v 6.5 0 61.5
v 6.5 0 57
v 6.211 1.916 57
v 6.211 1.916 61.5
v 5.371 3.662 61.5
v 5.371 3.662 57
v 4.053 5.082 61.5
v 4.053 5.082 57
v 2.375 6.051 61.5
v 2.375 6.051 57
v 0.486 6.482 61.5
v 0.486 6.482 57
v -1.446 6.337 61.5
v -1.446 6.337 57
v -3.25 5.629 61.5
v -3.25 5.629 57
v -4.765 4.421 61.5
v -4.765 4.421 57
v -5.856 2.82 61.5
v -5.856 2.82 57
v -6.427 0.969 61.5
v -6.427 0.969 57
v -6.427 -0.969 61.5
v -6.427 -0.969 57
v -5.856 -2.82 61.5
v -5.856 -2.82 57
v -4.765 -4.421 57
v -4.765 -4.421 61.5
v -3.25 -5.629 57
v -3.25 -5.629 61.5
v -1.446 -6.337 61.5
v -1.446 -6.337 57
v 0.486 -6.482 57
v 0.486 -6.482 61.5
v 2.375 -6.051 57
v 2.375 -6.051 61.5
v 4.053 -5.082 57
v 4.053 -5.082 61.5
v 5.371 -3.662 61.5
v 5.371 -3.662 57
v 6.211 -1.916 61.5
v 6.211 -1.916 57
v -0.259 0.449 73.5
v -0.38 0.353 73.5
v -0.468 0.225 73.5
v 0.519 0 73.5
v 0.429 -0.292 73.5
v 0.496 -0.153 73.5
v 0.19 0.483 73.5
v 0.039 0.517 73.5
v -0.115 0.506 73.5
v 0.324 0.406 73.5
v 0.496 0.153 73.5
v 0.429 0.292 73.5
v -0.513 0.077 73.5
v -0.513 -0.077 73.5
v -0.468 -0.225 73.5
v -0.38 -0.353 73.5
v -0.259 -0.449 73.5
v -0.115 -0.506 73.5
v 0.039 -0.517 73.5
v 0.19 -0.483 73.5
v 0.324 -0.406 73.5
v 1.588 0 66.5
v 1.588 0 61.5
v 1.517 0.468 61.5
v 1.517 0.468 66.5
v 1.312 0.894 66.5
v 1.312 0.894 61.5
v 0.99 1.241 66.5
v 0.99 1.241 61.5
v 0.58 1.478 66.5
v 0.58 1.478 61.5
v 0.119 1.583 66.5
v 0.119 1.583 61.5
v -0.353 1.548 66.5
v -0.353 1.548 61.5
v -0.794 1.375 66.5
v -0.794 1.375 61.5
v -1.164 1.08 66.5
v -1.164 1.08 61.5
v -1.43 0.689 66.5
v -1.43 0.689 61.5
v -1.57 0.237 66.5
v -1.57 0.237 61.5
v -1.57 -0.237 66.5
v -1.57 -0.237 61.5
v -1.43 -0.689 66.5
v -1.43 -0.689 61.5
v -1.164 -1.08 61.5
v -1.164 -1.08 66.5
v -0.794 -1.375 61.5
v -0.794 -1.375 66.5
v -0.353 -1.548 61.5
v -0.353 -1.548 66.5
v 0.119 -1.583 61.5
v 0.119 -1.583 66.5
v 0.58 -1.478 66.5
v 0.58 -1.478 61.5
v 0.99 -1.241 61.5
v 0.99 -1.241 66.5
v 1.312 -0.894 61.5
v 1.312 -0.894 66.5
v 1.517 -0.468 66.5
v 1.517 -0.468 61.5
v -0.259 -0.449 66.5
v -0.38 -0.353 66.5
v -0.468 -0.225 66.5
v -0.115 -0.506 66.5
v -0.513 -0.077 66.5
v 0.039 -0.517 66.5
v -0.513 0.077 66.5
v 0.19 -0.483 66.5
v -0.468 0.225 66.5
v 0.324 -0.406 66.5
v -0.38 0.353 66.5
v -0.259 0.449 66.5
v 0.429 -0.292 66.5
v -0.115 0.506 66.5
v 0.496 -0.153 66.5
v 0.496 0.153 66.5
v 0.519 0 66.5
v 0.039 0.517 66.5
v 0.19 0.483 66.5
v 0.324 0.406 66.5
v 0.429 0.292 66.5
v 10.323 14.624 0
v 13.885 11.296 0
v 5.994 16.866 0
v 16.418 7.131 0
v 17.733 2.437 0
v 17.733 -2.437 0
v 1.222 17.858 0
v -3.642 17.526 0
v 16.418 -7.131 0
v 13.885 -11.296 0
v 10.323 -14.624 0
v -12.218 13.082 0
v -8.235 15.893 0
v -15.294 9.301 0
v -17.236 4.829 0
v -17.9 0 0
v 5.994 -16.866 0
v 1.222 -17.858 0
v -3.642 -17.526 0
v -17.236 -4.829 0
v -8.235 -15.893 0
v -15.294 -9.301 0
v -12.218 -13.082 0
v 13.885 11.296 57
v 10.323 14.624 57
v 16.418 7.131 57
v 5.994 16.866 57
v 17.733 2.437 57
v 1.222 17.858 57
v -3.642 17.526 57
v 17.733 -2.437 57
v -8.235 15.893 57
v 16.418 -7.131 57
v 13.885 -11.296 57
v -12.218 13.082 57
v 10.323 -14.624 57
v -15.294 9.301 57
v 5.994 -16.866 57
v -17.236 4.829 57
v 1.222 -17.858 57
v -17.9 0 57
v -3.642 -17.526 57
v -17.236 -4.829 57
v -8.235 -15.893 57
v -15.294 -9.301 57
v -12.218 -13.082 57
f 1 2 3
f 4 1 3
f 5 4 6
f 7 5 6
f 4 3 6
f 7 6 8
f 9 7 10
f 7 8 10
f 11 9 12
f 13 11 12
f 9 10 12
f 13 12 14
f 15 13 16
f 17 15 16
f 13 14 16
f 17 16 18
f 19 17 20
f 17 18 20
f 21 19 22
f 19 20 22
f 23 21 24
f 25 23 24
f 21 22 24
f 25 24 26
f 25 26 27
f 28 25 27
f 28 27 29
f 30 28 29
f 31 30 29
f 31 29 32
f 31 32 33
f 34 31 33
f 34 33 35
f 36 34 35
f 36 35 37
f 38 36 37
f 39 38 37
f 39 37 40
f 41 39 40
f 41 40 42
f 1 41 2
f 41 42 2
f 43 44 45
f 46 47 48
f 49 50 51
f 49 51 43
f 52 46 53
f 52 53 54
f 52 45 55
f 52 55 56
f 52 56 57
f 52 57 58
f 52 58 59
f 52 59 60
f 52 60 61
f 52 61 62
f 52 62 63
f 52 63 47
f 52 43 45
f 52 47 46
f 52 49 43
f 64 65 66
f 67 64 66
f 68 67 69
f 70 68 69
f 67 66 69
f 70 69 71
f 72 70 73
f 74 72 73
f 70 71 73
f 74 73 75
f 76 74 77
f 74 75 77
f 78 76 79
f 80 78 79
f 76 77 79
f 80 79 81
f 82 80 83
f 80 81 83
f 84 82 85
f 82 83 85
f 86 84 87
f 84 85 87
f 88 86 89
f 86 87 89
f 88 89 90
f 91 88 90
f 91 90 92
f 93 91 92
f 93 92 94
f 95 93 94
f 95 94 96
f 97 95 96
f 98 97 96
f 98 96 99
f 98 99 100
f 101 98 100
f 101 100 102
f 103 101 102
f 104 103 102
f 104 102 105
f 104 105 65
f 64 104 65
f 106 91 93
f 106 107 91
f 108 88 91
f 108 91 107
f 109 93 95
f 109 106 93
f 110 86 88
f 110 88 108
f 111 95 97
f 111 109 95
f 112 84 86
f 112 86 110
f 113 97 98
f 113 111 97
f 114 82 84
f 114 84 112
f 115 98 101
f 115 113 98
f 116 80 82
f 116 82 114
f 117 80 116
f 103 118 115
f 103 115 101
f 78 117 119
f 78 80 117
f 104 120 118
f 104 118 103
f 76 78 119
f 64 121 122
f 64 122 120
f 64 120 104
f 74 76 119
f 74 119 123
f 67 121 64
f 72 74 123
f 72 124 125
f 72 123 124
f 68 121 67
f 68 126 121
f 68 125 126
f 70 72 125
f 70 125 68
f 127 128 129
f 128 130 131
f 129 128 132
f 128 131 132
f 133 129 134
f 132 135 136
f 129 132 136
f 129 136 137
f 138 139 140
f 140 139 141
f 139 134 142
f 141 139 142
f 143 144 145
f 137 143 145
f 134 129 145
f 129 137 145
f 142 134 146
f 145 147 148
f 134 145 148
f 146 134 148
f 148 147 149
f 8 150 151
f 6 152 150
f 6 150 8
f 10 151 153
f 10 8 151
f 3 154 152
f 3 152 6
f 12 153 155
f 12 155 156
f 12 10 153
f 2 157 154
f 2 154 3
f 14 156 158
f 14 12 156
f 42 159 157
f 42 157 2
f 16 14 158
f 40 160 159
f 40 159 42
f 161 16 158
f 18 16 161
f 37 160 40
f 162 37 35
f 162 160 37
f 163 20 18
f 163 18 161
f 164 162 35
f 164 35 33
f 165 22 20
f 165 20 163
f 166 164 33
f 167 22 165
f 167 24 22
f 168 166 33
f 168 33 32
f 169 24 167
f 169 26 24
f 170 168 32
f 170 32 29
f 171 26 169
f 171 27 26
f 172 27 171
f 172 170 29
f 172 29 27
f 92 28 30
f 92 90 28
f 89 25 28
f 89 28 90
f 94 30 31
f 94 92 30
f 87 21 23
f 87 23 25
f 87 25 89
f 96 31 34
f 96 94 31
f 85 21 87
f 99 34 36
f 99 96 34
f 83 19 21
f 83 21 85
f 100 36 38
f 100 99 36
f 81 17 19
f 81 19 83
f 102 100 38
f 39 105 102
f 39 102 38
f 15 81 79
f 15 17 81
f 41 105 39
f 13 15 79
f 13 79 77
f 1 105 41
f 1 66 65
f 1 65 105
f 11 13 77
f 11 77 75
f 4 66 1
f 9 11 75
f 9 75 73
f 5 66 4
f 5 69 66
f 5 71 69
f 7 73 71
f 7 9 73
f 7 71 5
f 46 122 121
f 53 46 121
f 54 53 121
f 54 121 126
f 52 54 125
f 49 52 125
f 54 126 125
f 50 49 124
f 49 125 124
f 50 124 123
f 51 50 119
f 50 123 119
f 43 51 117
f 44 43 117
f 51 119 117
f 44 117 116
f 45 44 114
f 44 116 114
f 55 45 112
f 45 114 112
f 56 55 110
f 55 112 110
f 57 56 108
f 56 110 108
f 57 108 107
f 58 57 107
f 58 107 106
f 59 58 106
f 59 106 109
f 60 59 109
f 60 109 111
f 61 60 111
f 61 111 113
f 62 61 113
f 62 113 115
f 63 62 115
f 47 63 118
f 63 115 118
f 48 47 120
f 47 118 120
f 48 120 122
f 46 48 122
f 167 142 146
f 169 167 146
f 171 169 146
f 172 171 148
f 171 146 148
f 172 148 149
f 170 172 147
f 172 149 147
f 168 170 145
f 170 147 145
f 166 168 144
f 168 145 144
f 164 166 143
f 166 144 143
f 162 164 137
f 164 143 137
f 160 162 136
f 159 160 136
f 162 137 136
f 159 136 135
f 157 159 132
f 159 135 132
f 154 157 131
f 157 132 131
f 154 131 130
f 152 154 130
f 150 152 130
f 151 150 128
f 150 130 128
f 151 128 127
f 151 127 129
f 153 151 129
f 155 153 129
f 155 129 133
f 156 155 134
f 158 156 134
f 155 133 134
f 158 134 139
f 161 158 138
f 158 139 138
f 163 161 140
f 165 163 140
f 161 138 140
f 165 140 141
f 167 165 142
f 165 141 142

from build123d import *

# Parameters (mm, degrees)
SKETCH1_R           = 17.9
BOSS_EXTRUDE1_DEPTH = 57
SKETCH2_R           = 6.5
BOSS_EXTRUDE2_DEPTH = 4.5
SKETCH3_R           = 1.5875
BOSS_EXTRUDE3_DEPTH = 12
CUT_EXTRUDE1_START  = -7
SKETCH4_R           = 1.5875
SKETCH4_R_2         = 0.518930275
CUT_EXTRUDE1_DEPTH  = 7


with BuildPart() as part:
    # Sketch1 → Boss-Extrude1 (new body)
    with BuildSketch(Plane.XY):
        with Locations(Location((0, 0, 0), (0, 0, 180))):
            Circle(SKETCH1_R)
    extrude(amount=BOSS_EXTRUDE1_DEPTH)

    # Sketch2 → Boss-Extrude2 (add)
    with BuildSketch(Plane.XY.offset(57)):
        Circle(SKETCH2_R)
    extrude(amount=BOSS_EXTRUDE2_DEPTH)

    # Sketch3 → Boss-Extrude3 (add)
    with BuildSketch(Plane.XY.offset(61.5)):
        Circle(SKETCH3_R)
    extrude(amount=BOSS_EXTRUDE3_DEPTH)

    # Sketch4 → Cut-Extrude1 (cut)
    with BuildSketch(Plane.XY.offset(73.5).offset(CUT_EXTRUDE1_START)):
        Circle(SKETCH4_R)
        Circle(SKETCH4_R_2, mode=Mode.SUBTRACT)
    extrude(amount=CUT_EXTRUDE1_DEPTH, mode=Mode.SUBTRACT)


solid = part.part
